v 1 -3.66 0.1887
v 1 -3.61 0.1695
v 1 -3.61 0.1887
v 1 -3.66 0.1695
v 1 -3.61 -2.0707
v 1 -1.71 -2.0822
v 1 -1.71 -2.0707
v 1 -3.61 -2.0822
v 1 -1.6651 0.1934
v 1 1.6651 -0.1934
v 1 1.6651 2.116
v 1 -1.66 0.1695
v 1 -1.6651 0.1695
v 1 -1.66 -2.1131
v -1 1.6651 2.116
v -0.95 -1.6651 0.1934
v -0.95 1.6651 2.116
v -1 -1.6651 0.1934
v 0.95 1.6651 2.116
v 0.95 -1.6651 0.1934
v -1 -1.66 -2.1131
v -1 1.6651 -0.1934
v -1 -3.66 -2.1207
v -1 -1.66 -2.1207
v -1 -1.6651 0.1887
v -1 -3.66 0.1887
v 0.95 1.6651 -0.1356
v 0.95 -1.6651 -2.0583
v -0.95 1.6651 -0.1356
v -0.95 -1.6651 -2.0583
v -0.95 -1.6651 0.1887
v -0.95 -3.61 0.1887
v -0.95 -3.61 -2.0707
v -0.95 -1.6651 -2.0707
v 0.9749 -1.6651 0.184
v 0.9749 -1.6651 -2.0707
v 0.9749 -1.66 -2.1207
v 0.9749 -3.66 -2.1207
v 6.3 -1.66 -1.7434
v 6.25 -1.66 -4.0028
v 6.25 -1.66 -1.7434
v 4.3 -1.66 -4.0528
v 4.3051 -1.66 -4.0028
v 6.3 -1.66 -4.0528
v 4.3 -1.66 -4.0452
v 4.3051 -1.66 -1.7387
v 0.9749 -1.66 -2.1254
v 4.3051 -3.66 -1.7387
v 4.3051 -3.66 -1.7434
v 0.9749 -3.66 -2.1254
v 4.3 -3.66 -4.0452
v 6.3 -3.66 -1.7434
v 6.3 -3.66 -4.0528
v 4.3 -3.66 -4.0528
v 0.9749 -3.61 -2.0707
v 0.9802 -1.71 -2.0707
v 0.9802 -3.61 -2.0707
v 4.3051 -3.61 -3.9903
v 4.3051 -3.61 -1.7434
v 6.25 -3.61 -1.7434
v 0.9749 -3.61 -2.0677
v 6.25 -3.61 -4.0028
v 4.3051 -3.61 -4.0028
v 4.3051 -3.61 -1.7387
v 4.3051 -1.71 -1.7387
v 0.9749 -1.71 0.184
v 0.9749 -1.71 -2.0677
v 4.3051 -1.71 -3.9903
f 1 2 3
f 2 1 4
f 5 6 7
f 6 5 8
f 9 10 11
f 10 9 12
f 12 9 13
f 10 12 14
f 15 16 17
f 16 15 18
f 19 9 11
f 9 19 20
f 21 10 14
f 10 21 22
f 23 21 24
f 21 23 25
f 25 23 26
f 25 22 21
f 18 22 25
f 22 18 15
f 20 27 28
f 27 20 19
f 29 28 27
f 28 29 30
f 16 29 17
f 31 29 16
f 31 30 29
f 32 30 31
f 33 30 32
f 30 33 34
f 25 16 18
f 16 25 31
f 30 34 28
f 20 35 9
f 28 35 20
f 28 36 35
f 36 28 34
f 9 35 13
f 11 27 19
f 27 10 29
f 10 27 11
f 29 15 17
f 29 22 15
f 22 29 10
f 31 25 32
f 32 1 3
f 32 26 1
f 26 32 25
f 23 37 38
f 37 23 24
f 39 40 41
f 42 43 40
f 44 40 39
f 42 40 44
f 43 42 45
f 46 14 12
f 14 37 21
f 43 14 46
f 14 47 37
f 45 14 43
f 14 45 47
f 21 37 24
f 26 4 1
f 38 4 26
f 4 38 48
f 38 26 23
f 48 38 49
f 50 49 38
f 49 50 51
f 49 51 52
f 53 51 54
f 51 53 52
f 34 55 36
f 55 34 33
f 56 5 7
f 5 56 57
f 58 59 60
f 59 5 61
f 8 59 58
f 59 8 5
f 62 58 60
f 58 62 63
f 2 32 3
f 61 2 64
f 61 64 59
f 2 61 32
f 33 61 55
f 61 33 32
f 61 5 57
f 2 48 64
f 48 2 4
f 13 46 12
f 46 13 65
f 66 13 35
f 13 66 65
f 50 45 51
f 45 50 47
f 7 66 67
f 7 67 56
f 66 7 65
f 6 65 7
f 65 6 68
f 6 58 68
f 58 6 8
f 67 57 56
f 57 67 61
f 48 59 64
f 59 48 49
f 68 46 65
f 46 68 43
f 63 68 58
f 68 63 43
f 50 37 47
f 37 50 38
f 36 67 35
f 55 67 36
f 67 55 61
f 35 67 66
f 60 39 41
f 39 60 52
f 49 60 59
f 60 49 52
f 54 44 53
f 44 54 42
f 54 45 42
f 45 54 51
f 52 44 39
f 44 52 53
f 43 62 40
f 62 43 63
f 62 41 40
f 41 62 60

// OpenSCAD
module cube_diversity(width, length, height){
    cube(size = [width, length, height], center = true);
}
//Example: translate([0,0,10]) cube_eli(3,9,1);

module cylinder_diversity(h, r1, r2, $fn){
    center = true;
    cylinder(size = [h,r1,r2,$fn]);
}
//Example: cylinder_eli(10, 10, 10, 30);

module sphere_diversity(r, $fa, $fn){
    center = true;
    sphere(size = [r,$fa,$fn]);
} 
//Example: sphere_eli(r, $fa, $fn);

module ramp_diversityfinal(){
    module ramp_diversity(){
        rotate([30,0,0]) difference(){
        cube_diversity(2,5,2);
        translate([0,0,0.05])cube_diversity(1.9,5,2);
    }}


    module ramp_diversity1(){difference(){
       ramp_diversity();
       translate([0,-(1+2.5*cos(30)),-1])cube_diversity(2,3,3);
    }}

    difference(){
       ramp_diversity1();
       translate([0,(1+2.5*cos(30)),1])cube_diversity(2,3,3);
    }
}

module corner_diversity(){
    difference(){
    cube_diversity(2,2,4/sqrt(3));
    translate([0.05,0.05,0.05])cube_diversity(2,2,4/sqrt(3));
}}

module ramppluscorner(){ramp_diversityfinal();
translate([0,-2.66,-.5*sqrt(3)-0.10])corner_diversity();
}

ramppluscorner();
translate([2.64,-2.66,-sqrt(3)-0.20])rotate([0,0,90])ramppluscorner();
